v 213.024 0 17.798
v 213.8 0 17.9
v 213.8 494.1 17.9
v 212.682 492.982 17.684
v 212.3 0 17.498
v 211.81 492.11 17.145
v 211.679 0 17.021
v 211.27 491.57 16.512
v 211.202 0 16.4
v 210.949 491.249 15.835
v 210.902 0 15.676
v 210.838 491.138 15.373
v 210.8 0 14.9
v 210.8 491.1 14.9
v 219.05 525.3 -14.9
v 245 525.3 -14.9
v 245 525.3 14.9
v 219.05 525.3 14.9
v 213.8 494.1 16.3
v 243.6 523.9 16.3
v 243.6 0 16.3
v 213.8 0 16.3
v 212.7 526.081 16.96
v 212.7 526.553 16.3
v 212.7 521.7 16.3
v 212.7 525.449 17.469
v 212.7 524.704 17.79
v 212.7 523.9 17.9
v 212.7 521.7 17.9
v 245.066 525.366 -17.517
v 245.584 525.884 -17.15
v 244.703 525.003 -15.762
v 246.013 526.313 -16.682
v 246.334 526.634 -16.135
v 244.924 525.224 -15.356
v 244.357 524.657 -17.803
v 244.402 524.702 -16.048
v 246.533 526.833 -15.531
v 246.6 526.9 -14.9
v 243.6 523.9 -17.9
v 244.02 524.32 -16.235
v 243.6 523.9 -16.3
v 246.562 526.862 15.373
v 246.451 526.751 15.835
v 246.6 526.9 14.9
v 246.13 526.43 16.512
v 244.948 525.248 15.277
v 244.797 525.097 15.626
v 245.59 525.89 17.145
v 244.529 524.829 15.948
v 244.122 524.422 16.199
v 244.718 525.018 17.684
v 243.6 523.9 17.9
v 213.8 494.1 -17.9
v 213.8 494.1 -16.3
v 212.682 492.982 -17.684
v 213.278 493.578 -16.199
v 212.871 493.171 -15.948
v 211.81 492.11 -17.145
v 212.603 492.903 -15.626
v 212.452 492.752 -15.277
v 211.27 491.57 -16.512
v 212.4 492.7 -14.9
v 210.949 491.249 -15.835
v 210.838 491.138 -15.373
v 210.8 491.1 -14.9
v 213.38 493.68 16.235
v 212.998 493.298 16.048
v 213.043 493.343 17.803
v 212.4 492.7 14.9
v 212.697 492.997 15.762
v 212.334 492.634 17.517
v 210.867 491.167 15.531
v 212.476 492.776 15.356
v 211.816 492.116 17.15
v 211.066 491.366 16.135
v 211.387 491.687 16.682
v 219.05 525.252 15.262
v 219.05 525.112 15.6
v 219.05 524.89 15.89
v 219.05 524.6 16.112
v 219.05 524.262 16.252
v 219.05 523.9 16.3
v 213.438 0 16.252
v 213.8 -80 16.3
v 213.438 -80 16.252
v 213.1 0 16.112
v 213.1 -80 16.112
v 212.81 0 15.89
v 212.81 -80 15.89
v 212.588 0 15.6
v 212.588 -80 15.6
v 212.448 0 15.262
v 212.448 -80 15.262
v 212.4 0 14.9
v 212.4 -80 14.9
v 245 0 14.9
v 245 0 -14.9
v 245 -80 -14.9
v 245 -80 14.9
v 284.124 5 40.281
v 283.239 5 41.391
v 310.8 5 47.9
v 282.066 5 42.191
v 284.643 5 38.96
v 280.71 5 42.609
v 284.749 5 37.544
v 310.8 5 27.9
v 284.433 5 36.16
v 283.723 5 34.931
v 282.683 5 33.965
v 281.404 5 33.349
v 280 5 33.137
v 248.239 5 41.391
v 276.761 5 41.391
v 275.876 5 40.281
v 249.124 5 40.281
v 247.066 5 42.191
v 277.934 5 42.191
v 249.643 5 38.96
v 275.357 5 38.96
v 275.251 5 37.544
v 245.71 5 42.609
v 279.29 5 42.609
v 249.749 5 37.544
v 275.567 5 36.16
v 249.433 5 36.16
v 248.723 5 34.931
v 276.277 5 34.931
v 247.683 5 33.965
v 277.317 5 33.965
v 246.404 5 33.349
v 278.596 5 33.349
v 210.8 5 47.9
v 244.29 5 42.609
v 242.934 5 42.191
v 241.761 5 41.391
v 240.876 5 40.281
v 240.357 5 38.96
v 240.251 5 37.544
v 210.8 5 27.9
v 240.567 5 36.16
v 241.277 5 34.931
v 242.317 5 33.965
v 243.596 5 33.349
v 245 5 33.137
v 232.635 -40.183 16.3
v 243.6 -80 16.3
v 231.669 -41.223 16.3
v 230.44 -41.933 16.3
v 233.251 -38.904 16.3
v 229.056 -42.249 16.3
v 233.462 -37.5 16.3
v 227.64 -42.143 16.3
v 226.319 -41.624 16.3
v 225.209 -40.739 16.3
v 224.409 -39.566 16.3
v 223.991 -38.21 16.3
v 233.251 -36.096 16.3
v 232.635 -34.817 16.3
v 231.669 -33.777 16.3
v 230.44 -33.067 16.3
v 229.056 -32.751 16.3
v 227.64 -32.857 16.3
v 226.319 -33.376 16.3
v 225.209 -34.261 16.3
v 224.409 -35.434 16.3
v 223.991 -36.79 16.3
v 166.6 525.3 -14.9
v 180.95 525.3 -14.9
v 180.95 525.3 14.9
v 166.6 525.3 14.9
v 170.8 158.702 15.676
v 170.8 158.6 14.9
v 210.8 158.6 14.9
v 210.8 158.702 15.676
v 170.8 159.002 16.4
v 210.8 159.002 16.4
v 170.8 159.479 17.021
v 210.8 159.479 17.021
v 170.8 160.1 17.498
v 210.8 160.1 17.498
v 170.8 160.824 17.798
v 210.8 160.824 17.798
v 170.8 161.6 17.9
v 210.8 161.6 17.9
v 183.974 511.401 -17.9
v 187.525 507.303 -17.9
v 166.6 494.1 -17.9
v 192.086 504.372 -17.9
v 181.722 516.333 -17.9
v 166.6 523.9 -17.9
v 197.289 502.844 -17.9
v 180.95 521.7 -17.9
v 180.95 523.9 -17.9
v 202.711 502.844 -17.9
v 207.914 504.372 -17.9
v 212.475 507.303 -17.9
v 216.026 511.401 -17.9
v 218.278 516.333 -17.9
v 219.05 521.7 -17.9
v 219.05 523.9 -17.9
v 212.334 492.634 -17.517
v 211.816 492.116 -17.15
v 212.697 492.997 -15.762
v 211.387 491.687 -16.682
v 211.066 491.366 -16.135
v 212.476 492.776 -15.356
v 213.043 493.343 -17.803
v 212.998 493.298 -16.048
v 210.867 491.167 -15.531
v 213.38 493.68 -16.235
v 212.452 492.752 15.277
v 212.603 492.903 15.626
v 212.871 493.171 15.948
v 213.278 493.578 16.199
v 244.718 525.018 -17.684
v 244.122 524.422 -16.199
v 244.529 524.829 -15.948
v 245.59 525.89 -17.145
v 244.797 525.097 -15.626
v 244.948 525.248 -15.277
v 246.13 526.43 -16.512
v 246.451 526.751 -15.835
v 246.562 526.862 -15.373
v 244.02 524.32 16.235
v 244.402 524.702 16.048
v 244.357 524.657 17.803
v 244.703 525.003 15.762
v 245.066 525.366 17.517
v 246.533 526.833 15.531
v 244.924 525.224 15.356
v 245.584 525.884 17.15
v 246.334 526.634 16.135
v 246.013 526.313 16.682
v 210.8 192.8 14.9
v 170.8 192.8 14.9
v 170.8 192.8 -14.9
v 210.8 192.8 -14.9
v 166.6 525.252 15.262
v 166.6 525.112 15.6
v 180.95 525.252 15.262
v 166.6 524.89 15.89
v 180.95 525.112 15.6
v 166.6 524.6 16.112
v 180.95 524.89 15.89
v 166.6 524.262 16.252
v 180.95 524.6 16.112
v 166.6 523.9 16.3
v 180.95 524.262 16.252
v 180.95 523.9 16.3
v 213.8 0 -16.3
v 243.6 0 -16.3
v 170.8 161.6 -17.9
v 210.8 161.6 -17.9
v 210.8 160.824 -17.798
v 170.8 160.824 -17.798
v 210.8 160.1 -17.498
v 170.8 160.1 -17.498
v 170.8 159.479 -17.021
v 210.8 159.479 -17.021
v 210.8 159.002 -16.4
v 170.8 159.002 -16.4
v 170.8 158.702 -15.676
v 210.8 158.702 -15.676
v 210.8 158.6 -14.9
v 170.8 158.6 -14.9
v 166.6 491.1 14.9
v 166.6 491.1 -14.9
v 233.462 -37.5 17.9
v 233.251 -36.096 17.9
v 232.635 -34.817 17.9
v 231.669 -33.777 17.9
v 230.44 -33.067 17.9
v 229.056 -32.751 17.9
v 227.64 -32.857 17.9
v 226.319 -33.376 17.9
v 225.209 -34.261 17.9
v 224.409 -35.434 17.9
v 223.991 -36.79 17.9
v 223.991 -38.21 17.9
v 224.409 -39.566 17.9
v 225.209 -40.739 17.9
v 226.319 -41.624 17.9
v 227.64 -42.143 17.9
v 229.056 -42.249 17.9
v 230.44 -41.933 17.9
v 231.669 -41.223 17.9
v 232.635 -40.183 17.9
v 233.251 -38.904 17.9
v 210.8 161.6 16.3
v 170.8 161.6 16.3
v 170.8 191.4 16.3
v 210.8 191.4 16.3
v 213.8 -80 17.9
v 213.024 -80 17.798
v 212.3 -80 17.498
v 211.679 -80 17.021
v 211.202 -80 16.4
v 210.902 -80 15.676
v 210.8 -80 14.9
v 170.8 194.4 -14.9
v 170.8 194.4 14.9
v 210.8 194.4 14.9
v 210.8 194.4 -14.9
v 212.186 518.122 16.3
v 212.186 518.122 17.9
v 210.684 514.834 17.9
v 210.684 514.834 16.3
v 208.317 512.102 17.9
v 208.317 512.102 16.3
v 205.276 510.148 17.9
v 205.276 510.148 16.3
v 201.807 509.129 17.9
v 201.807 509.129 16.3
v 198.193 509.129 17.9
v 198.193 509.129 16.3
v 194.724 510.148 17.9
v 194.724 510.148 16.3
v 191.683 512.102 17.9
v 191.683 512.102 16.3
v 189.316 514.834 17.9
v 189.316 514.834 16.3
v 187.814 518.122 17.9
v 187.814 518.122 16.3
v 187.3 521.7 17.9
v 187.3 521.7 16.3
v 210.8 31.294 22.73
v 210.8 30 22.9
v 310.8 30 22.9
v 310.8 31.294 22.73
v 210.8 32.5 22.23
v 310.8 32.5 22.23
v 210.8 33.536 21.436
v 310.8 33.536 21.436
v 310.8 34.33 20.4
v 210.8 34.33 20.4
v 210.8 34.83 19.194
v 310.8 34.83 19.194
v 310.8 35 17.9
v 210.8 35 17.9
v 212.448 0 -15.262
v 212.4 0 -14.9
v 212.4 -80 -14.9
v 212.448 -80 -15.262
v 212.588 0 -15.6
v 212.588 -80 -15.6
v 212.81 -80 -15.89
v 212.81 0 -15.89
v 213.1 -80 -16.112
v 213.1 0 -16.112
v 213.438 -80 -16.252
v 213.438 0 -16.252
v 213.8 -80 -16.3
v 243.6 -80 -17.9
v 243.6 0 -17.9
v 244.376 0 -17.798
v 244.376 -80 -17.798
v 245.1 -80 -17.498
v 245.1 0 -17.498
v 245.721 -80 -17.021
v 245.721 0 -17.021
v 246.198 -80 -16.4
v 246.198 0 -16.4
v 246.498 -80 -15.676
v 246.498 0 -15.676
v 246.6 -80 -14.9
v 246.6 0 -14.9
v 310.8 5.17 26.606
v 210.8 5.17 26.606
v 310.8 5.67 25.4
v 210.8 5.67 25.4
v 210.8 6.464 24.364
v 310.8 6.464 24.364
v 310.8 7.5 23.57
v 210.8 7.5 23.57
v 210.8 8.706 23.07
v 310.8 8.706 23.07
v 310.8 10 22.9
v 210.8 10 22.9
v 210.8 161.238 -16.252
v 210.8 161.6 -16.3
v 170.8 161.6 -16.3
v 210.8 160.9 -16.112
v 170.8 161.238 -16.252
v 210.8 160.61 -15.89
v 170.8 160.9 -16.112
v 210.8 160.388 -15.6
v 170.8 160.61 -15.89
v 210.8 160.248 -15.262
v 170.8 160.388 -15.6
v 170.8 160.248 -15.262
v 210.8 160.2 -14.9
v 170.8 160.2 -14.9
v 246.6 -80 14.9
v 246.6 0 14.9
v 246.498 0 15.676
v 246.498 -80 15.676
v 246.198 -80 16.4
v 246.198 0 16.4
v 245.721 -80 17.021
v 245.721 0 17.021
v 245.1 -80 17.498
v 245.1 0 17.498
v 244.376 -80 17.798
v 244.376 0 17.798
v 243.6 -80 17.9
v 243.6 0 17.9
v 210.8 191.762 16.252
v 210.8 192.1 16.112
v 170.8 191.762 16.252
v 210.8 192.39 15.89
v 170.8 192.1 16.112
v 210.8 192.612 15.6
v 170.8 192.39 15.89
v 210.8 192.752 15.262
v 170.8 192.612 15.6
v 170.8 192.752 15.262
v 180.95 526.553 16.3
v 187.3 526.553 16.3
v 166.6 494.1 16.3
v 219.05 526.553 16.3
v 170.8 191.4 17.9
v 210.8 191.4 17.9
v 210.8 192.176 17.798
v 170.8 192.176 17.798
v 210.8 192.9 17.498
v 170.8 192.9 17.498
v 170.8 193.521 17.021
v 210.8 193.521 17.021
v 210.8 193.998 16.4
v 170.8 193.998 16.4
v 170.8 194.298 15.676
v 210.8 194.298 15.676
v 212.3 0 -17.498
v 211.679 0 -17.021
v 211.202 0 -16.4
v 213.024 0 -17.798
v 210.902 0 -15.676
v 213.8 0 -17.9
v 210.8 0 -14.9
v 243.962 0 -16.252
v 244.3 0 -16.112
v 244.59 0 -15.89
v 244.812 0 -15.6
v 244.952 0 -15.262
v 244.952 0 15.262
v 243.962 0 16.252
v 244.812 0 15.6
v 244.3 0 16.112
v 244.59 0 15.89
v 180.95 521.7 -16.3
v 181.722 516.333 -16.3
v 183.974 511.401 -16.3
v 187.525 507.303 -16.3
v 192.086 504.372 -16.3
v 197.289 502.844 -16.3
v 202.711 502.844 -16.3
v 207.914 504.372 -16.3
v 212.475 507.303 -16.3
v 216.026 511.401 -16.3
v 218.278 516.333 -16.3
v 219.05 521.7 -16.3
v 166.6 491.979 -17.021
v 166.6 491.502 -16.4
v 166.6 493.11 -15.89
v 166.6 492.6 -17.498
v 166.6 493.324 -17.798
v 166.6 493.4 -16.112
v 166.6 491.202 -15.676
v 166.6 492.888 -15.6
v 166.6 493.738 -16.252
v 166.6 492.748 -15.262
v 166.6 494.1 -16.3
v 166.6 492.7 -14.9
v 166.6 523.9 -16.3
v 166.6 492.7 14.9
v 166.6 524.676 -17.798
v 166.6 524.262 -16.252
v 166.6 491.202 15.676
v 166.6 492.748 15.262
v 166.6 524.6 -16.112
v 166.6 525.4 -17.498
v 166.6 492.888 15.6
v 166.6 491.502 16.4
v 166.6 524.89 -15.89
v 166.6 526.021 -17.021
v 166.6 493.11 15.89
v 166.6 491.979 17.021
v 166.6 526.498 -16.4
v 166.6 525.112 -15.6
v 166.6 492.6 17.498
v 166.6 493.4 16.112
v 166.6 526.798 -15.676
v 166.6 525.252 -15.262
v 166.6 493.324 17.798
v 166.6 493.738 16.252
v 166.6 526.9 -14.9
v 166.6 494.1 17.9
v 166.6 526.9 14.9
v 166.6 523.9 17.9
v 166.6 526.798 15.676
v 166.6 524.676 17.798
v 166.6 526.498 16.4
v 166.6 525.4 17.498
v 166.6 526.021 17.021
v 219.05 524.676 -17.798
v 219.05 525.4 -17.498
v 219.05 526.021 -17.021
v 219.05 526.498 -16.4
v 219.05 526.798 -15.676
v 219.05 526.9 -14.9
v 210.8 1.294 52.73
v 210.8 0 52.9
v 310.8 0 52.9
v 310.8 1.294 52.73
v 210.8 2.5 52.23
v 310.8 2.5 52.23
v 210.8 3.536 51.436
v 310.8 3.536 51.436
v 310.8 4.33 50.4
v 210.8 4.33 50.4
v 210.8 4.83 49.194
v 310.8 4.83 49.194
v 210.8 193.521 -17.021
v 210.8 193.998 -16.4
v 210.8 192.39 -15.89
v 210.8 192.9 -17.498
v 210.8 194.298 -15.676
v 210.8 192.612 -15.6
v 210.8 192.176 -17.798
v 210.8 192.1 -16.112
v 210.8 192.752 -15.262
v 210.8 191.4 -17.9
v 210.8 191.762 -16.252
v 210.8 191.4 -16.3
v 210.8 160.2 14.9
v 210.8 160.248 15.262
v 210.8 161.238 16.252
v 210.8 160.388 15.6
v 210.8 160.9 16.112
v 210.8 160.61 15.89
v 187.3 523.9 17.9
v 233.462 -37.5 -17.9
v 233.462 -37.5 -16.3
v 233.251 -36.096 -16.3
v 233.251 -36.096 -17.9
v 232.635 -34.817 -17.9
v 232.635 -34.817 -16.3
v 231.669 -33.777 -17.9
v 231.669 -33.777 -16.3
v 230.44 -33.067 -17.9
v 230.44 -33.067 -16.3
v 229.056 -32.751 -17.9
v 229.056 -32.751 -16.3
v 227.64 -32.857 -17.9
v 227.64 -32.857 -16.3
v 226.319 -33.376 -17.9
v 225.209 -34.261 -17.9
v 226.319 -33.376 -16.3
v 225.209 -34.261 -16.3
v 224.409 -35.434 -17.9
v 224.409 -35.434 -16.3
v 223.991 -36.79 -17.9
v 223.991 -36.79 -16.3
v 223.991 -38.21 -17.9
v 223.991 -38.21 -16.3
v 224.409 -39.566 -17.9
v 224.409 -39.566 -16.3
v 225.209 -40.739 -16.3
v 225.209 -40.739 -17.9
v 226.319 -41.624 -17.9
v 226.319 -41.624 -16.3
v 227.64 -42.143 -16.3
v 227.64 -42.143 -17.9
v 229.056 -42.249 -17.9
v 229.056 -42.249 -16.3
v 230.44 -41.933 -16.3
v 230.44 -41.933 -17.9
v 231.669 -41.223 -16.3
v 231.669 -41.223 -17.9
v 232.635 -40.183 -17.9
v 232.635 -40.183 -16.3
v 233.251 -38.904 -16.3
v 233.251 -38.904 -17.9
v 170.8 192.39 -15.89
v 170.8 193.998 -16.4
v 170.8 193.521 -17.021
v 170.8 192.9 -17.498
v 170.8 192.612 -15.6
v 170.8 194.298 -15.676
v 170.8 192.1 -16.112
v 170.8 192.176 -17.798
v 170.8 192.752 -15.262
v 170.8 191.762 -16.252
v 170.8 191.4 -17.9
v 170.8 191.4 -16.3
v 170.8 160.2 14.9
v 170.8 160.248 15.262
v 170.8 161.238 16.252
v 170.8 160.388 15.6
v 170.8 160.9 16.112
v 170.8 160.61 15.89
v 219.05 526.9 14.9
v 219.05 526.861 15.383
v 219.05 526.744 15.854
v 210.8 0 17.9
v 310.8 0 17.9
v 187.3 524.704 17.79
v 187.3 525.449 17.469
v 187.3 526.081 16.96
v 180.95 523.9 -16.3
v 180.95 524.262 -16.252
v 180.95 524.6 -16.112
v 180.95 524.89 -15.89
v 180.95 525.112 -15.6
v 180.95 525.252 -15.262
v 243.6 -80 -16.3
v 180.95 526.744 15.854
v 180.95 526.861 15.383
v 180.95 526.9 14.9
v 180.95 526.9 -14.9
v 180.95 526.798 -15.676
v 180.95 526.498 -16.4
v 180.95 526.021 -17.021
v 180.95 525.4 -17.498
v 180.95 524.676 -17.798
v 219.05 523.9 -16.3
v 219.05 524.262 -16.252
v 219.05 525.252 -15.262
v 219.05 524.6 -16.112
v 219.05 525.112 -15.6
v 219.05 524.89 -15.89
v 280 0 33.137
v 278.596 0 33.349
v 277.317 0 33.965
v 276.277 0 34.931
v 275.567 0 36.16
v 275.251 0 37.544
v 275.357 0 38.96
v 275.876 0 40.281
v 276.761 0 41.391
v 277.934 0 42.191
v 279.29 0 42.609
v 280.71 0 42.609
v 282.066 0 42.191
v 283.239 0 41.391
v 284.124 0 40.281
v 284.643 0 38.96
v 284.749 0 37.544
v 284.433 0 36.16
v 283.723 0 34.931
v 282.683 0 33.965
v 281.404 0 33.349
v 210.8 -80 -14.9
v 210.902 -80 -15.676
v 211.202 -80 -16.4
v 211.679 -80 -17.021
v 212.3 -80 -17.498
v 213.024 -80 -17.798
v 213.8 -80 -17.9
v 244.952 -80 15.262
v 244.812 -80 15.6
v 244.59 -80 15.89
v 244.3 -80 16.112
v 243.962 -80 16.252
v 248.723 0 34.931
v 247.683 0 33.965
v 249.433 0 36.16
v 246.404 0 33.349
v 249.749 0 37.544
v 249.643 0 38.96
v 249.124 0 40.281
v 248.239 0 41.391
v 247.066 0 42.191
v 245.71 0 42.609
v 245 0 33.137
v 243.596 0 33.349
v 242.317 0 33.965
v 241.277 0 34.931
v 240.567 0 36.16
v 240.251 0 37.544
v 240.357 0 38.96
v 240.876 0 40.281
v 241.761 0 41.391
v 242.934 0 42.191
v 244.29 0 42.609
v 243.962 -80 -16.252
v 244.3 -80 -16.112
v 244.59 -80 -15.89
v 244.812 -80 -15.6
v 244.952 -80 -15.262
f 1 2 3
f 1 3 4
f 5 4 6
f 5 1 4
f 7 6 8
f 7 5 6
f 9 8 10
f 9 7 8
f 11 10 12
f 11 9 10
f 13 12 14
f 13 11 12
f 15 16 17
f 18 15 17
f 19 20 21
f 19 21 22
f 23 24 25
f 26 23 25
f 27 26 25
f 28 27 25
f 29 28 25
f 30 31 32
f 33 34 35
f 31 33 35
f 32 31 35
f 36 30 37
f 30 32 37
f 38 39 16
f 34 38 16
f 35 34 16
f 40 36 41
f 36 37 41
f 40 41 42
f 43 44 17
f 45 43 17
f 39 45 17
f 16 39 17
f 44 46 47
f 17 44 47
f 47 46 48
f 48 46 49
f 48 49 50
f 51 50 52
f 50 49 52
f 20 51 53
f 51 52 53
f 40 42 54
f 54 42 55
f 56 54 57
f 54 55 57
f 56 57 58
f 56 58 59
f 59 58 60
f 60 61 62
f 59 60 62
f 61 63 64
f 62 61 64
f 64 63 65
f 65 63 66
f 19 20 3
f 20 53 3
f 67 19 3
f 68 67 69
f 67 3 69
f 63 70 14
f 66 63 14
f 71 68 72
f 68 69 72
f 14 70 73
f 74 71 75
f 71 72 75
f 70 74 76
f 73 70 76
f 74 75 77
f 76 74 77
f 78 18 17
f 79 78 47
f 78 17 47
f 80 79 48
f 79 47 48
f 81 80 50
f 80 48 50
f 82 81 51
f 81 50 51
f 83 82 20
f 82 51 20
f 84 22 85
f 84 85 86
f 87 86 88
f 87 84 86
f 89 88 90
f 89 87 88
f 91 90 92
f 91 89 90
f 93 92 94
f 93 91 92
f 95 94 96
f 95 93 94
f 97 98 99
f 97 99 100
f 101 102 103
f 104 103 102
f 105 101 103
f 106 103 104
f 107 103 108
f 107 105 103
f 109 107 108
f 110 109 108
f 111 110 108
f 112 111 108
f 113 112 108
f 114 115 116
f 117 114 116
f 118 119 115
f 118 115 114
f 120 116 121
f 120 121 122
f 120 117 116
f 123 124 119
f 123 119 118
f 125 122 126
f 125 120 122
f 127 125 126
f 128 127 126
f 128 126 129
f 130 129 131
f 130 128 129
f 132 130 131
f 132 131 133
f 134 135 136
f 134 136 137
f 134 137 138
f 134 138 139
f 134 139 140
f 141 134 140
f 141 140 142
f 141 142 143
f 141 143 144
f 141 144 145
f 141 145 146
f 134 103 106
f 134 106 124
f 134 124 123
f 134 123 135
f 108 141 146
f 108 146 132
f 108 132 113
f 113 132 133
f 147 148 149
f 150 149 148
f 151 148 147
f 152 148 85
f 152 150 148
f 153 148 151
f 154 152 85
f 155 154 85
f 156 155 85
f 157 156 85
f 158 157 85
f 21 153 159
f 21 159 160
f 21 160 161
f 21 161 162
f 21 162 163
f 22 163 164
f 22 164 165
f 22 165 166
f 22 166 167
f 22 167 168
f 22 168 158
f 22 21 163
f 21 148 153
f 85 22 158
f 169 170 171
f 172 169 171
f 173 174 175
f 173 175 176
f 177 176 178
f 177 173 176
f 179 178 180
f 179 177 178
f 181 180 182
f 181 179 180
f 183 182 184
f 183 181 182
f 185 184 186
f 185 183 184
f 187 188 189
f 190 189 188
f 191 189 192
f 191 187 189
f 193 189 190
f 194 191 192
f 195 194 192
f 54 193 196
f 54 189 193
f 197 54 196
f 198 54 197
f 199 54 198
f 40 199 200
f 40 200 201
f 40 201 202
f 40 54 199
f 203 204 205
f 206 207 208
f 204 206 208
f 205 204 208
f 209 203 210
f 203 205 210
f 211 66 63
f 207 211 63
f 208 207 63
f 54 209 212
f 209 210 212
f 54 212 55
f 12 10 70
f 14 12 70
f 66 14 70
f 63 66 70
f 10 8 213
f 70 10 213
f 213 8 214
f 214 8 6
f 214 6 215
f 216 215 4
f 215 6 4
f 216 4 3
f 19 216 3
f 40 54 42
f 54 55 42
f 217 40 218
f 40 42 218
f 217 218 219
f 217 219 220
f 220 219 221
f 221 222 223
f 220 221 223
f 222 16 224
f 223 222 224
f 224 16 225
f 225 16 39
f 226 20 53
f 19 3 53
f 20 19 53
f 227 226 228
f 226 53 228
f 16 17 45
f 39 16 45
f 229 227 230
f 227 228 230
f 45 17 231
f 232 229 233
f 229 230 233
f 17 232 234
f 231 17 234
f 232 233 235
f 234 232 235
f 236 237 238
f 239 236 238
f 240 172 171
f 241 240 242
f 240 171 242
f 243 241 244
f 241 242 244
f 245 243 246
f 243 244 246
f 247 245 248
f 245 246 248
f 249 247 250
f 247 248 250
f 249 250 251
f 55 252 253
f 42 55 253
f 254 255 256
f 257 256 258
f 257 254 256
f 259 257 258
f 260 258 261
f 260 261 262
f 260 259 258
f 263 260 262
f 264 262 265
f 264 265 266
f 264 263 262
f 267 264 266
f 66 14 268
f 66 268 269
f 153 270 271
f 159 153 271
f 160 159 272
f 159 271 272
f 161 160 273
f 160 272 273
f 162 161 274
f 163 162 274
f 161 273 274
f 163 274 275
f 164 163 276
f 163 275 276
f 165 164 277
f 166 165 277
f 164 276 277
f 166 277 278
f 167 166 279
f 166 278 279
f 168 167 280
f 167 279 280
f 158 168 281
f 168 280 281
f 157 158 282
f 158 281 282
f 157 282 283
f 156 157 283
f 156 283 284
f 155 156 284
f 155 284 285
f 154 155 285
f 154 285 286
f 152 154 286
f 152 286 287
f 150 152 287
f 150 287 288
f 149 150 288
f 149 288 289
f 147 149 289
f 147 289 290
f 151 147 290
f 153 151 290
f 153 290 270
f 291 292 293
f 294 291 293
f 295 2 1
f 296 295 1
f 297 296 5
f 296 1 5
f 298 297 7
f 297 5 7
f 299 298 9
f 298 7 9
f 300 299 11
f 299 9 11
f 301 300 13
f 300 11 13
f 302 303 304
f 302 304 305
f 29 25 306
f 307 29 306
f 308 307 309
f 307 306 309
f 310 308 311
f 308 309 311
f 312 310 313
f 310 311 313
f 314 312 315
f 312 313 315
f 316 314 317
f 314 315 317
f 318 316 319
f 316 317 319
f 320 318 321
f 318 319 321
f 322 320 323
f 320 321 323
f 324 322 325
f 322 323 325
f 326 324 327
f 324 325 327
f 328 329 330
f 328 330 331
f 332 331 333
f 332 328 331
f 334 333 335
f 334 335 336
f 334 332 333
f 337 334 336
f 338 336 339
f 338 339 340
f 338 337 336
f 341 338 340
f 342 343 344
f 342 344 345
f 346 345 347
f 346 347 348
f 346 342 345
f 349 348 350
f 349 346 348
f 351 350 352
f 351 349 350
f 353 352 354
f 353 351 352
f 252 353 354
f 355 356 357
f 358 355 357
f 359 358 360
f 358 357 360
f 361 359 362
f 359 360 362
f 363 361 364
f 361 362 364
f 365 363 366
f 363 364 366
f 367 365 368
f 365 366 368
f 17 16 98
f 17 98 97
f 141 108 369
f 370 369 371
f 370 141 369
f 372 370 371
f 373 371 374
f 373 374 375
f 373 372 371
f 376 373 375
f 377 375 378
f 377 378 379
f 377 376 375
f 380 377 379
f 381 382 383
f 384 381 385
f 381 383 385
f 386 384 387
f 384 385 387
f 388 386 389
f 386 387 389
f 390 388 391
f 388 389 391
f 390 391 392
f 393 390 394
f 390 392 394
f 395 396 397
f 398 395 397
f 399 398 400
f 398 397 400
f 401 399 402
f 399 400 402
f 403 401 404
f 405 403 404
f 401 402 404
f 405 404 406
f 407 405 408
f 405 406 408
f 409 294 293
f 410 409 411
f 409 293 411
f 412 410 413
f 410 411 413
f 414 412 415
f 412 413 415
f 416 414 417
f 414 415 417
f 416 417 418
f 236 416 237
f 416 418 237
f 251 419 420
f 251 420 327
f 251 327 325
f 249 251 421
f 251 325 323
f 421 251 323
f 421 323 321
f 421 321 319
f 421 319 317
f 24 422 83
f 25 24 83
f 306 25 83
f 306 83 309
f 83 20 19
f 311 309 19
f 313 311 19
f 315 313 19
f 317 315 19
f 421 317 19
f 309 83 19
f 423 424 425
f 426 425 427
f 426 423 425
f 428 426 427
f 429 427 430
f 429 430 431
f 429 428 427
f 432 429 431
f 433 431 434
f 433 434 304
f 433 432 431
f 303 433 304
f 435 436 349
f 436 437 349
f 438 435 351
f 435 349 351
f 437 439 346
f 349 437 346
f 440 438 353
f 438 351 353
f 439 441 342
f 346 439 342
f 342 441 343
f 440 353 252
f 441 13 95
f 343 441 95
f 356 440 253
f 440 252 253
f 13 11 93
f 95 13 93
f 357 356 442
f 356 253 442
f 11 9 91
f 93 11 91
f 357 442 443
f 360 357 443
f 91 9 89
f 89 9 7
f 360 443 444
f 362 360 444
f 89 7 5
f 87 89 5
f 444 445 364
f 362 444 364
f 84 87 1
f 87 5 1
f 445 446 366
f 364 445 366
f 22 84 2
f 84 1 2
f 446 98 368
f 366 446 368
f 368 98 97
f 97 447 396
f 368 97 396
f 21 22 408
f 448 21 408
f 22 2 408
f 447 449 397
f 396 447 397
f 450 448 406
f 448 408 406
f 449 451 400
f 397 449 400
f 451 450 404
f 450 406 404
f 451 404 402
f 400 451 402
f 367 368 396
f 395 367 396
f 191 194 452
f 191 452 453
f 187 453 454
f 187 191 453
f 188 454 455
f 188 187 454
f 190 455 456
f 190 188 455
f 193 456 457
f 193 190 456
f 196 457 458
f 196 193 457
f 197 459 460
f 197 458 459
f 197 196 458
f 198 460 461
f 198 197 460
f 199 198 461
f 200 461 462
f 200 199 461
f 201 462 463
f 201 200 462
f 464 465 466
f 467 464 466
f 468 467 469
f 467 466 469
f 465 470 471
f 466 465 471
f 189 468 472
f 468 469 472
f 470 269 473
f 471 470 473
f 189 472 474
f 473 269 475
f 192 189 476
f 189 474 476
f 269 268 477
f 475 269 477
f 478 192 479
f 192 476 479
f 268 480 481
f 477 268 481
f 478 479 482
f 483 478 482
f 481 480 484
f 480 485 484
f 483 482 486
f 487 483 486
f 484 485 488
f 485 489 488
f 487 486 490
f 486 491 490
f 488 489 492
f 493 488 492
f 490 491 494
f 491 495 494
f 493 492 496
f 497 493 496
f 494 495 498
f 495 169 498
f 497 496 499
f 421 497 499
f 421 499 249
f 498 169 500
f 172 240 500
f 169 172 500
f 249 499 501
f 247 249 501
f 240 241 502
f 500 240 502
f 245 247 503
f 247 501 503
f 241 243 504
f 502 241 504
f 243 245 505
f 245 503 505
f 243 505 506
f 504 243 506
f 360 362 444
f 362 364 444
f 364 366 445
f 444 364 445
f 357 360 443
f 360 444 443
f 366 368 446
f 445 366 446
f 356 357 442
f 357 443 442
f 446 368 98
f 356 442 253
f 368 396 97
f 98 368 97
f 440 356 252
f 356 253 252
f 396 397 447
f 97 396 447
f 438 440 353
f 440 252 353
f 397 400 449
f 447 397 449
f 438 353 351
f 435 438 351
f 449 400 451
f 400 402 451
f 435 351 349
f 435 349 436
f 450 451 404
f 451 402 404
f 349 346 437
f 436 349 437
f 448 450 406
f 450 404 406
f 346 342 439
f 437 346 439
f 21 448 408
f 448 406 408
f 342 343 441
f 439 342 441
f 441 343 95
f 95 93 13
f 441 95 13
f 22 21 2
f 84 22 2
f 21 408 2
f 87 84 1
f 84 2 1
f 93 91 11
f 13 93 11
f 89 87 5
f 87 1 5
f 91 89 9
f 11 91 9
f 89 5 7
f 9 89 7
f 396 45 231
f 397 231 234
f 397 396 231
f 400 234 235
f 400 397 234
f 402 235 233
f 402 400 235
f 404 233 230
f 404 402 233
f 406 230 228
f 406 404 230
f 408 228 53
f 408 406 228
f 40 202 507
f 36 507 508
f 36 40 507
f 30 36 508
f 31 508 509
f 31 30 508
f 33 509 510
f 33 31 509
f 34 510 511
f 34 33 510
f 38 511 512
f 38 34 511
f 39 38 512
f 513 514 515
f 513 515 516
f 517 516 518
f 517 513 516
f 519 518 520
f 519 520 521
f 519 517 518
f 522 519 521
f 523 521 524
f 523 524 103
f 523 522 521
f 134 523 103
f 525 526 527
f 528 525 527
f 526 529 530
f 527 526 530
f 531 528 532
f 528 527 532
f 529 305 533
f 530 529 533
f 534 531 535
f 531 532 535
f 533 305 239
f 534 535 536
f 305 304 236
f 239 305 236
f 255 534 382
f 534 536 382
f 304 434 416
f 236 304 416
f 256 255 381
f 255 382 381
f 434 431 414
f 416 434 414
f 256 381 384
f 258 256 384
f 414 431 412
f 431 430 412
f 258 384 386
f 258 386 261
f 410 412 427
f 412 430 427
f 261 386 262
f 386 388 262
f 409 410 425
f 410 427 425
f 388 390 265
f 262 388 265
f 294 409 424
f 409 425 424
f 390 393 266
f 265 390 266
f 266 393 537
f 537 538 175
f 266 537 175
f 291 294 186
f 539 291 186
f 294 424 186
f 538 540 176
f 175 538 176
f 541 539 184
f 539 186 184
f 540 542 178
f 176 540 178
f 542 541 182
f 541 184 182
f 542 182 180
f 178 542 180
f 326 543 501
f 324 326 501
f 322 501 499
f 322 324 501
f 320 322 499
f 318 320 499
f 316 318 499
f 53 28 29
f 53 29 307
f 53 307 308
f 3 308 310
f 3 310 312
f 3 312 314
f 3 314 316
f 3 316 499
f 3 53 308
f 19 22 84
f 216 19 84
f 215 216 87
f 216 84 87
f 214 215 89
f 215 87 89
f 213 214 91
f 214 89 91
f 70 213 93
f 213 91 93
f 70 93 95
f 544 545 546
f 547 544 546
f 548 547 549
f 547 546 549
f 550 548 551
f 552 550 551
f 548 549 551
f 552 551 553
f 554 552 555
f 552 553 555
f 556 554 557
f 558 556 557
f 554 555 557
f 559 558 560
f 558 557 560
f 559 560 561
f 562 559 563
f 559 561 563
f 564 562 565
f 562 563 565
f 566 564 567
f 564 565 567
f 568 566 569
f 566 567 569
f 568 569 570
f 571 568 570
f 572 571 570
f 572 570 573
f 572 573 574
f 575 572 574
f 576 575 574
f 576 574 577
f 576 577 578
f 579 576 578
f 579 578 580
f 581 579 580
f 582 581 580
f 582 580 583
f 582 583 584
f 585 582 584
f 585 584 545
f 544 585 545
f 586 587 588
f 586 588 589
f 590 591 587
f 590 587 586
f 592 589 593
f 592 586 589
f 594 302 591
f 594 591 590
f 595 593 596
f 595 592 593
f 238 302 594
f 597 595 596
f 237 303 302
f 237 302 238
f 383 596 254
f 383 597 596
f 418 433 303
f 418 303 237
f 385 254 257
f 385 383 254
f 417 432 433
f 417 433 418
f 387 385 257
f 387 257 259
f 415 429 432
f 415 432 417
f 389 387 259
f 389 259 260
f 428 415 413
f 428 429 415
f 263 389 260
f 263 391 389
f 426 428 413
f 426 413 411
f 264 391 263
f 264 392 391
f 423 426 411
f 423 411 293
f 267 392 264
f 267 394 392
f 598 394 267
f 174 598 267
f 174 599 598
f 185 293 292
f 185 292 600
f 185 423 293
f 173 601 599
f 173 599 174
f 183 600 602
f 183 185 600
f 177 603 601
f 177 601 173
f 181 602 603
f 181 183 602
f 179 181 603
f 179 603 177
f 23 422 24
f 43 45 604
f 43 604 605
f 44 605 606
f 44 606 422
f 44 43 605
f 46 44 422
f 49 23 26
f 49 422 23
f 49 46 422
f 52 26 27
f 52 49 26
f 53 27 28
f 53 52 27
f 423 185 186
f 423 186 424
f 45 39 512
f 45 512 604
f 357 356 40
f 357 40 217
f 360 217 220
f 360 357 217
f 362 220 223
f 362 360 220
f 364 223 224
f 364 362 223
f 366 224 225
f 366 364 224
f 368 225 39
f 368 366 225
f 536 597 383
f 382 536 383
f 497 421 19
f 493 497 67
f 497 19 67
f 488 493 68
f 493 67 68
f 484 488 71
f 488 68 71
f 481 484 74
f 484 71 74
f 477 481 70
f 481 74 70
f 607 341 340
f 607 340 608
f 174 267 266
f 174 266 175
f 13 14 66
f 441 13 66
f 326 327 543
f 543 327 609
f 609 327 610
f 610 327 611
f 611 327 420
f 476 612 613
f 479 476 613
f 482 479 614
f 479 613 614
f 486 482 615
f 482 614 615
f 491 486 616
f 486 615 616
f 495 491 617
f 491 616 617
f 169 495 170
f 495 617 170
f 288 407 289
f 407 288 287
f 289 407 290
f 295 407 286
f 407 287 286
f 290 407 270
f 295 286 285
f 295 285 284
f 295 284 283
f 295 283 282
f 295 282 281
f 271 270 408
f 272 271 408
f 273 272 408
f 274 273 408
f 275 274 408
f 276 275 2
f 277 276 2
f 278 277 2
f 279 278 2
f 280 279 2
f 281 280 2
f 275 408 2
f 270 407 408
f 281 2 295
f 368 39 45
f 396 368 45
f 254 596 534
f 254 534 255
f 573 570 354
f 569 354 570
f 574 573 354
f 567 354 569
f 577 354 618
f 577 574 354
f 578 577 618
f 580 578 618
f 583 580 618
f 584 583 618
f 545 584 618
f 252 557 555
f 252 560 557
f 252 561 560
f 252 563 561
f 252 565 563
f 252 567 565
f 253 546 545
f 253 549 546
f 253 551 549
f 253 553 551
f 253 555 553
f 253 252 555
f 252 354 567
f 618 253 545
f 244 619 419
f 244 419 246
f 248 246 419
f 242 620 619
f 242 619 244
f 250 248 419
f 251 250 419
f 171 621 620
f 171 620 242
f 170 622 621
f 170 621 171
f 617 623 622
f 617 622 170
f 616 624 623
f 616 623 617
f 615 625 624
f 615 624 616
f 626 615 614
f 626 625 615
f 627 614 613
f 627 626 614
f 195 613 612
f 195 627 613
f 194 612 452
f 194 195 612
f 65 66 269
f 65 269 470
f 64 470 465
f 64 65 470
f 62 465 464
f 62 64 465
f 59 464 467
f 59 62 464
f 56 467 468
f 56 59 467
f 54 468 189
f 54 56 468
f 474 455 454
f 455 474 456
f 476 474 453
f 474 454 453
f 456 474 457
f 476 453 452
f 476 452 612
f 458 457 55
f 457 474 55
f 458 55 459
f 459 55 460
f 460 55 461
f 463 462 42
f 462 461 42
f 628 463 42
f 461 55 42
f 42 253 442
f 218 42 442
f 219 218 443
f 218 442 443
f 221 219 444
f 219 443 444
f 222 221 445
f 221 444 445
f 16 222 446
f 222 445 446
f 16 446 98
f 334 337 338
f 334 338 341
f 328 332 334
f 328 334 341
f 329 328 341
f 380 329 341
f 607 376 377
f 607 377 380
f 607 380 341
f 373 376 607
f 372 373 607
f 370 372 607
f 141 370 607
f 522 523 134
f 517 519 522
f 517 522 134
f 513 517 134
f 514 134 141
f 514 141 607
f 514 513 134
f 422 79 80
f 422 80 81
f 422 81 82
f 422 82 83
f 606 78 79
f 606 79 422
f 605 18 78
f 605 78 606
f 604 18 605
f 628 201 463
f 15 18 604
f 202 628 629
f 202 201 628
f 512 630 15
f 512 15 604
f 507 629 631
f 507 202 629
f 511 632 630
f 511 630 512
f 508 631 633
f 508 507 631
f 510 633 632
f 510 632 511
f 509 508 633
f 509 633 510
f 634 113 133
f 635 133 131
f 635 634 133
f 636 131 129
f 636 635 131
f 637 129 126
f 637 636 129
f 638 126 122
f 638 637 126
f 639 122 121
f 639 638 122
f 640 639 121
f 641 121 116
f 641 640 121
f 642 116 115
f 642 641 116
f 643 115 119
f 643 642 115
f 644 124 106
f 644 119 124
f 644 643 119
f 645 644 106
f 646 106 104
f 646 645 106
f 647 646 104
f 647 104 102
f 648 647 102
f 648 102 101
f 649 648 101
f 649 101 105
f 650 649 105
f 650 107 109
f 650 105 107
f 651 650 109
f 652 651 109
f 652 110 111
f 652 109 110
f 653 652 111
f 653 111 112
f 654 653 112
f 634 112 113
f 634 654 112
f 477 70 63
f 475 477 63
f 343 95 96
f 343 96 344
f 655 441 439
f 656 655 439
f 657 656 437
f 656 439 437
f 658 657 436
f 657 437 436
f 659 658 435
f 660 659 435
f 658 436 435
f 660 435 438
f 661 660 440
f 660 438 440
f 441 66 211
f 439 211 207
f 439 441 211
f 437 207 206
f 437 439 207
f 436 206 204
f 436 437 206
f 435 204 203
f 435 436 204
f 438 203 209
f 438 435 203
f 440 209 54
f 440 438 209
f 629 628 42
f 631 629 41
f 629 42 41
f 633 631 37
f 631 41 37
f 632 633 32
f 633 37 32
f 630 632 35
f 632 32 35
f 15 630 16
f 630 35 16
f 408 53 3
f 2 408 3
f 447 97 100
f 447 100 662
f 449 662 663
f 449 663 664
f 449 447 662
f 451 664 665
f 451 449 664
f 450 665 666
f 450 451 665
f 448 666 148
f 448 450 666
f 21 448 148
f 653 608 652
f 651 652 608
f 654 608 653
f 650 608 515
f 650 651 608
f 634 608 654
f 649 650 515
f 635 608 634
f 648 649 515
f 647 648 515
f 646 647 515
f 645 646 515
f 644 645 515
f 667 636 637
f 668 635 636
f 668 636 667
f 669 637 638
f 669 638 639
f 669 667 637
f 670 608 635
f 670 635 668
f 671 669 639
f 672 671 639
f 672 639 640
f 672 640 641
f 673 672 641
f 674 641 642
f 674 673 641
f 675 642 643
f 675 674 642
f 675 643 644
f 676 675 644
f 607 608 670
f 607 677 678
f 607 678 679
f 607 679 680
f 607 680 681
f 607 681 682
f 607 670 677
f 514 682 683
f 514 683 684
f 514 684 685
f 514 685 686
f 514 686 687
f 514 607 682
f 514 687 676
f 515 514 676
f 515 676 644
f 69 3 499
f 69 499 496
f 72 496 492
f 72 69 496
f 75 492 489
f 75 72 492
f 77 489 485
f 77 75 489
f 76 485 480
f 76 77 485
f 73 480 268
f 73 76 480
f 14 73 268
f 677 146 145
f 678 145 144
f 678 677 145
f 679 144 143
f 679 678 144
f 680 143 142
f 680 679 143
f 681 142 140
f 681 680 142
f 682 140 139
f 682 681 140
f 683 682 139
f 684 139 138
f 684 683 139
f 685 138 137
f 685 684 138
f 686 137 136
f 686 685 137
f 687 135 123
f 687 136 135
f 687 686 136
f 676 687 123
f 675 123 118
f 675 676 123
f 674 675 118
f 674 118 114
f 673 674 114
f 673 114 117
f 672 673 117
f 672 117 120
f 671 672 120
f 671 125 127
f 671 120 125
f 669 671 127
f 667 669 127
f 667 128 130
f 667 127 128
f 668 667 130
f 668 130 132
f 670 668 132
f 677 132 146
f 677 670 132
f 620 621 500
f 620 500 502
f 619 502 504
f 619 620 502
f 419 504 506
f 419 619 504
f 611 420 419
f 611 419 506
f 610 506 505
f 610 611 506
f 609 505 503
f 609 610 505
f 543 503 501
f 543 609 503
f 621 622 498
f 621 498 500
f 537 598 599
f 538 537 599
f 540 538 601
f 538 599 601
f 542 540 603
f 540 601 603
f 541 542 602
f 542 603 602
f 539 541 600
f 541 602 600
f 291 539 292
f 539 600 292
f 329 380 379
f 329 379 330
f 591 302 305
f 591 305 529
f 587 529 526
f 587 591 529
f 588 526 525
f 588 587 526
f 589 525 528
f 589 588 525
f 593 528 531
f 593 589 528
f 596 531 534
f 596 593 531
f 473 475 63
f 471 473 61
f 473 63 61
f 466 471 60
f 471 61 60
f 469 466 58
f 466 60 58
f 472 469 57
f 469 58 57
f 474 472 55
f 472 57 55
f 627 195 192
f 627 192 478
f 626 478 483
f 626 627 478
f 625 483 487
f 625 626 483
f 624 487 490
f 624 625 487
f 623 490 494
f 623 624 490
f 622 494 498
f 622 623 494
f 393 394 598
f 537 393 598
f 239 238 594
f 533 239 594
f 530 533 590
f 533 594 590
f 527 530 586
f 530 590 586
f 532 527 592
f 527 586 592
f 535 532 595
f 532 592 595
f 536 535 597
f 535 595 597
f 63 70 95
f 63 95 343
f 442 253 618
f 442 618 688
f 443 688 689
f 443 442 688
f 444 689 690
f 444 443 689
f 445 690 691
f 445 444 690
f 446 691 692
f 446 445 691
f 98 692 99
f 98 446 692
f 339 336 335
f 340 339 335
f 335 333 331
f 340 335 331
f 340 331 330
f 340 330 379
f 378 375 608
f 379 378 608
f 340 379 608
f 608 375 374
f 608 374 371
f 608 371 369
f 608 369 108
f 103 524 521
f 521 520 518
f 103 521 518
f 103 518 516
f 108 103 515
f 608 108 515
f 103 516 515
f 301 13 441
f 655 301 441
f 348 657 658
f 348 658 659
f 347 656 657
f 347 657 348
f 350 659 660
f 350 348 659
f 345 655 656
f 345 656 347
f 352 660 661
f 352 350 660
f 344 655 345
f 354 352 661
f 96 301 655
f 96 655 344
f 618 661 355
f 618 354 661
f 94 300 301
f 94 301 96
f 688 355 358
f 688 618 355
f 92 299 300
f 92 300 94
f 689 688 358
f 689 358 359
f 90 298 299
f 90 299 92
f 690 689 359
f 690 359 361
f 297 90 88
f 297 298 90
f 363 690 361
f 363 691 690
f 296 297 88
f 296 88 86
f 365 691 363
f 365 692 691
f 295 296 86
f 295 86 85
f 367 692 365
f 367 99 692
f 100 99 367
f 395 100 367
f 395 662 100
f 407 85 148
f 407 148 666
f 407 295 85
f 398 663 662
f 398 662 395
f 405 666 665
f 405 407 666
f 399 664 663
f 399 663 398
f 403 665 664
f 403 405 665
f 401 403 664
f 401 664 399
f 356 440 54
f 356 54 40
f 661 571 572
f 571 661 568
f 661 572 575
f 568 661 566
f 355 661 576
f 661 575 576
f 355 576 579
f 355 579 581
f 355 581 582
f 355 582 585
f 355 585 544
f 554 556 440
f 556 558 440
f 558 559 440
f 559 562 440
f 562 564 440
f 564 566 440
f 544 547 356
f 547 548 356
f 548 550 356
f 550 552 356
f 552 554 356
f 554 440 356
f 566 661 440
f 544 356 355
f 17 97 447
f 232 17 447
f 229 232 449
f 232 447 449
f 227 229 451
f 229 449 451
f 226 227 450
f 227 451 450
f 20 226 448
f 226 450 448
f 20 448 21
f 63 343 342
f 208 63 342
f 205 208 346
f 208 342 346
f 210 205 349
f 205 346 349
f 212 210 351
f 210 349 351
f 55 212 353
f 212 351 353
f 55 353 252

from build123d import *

# Parameters (mm, degrees)
STRUCTURAL_MEMBERMAIN_DEPTH        = 1
STRUCTURAL_MEMBERMAIN_DEPTH_BACK   = 80
STRUCTURAL_MEMBERMAIN_2_DEPTH      = 536.314422766
STRUCTURAL_MEMBERMAIN_3_DEPTH      = 88.414422766
STRUCTURAL_MEMBERMAIN_4_DEPTH      = 58.9
CUT_EXTRUDETOPRAILGUIDE_DEPTH      = 583.027129952
CUT_EXTRUDETOPRAILGUIDE_DEPTH_BACK = 583.027129952
STRUCTURAL_MEMBERANGLE_DEPTH       = 100
SKETCH15_R                         = 4.7625
CUT_EXTRUDEMOUNTINGHOLES_DEPTH     = 615.018452491
CUT_EXTRUDEENLARGERAILGUIDE_START  = -17.9
CUT_EXTRUDEENLARGERAILGUIDE_DEPTH  = 34.2
SKETCH17_R                         = 4.7625
CUT_EXTRUDE1_DEPTH                 = 613.782090143


with BuildPart() as part:
    # Sketch11 → Structural MemberMain (new, two sides)
    with BuildSketch(Plane(origin=(228.7, 0, 0), x_dir=(-1, 0, 0), z_dir=(0, 1, 0))) as structural_membermain_sk:
        with BuildLine():
            Line((-14.9, 17.9), (14.9, 17.9))
            ThreePointArc((14.9, 17.9), (17.021320344, 17.021320344), (17.9, 14.9))
            Line((17.9, 14.9), (17.9, -14.9))
            ThreePointArc((17.9, -14.9), (17.021320344, -17.021320344), (14.9, -17.9))
            Line((14.9, -17.9), (-14.9, -17.9))
            ThreePointArc((-14.9, -17.9), (-17.021320344, -17.021320344), (-17.9, -14.9))
            Line((-17.9, -14.9), (-17.9, 14.9))
            ThreePointArc((-17.9, 14.9), (-17.021320344, 17.021320344), (-14.9, 17.9))
        make_face()
        with BuildLine():
            Line((-14.9, 16.3), (14.9, 16.3))
            ThreePointArc((14.9, 16.3), (15.889949494, 15.889949494), (16.3, 14.9))
            Line((16.3, 14.9), (16.3, -14.9))
            ThreePointArc((16.3, -14.9), (15.889949494, -15.889949494), (14.9, -16.3))
            Line((14.9, -16.3), (-14.9, -16.3))
            ThreePointArc((-14.9, -16.3), (-15.889949494, -15.889949494), (-16.3, -14.9))
            Line((-16.3, -14.9), (-16.3, 14.9))
            ThreePointArc((-16.3, 14.9), (-15.889949494, 15.889949494), (-14.9, 16.3))
        make_face(mode=Mode.SUBTRACT)
    extrude(amount=STRUCTURAL_MEMBERMAIN_DEPTH)
    extrude(structural_membermain_sk.sketch, amount=-STRUCTURAL_MEMBERMAIN_DEPTH_BACK)

    # Structural MemberMain mitre 1
    split(bisect_by=Plane(origin=(228.7, 0, 0), x_dir=(1, 0, 0), z_dir=(0, -1, 0)), keep=Keep.TOP)

    # Sketch17 → Cut-Extrude1 (cut, through all)
    with BuildSketch(Plane.XY.offset(17.9)):
        with Locations((228.7, -37.5)):
            Circle(SKETCH17_R)
    extrude(amount=-CUT_EXTRUDE1_DEPTH, mode=Mode.SUBTRACT)


with BuildPart() as body_2:
    # Sketch11 on segment 2 (carried to segment 2) → Structural MemberMain 2 (new body)
    with BuildSketch(Plane(origin=(228.7, -1, 0), x_dir=(-1, 0, 0), z_dir=(0, 1, 0))):
        with BuildLine():
            Line((-14.9, 17.9), (14.9, 17.9))
            ThreePointArc((14.9, 17.9), (17.021320344, 17.021320344), (17.9, 14.9))
            Line((17.9, 14.9), (17.9, -14.9))
            ThreePointArc((17.9, -14.9), (17.021320344, -17.021320344), (14.9, -17.9))
            Line((14.9, -17.9), (-14.9, -17.9))
            ThreePointArc((-14.9, -17.9), (-17.021320344, -17.021320344), (-17.9, -14.9))
            Line((-17.9, -14.9), (-17.9, 14.9))
            ThreePointArc((-17.9, 14.9), (-17.021320344, 17.021320344), (-14.9, 17.9))
        make_face()
        with BuildLine():
            Line((-14.9, 16.3), (14.9, 16.3))
            ThreePointArc((14.9, 16.3), (15.889949494, 15.889949494), (16.3, 14.9))
            Line((16.3, 14.9), (16.3, -14.9))
            ThreePointArc((16.3, -14.9), (15.889949494, -15.889949494), (14.9, -16.3))
            Line((14.9, -16.3), (-14.9, -16.3))
            ThreePointArc((-14.9, -16.3), (-15.889949494, -15.889949494), (-16.3, -14.9))
            Line((-16.3, -14.9), (-16.3, 14.9))
            ThreePointArc((-16.3, 14.9), (-15.889949494, 15.889949494), (-14.9, 16.3))
        make_face(mode=Mode.SUBTRACT)
    extrude(amount=STRUCTURAL_MEMBERMAIN_2_DEPTH)

    # Structural MemberMain 2 mitre 1
    split(bisect_by=Plane(origin=(228.7, 0, 0), x_dir=(-1, 0, 0), z_dir=(0, 1, 0)), keep=Keep.TOP)

    # Structural MemberMain 2 mitre 2
    split(bisect_by=Plane(origin=(228.7, 509, 0), x_dir=(0.707106781, 0.707106781, 0), z_dir=(0.707106781, -0.707106781, 0)), keep=Keep.TOP)


with BuildPart() as body_3:
    # Sketch11 on segment 3 (carried to segment 3) → Structural MemberMain 3 (new body)
    with BuildSketch(Plane(origin=(255.014422766, 509, 0), x_dir=(0, -1, 0), z_dir=(-1, 0, 0))):
        with BuildLine():
            Line((-14.9, 17.9), (14.9, 17.9))
            ThreePointArc((14.9, 17.9), (17.021320344, 17.021320344), (17.9, 14.9))
            Line((17.9, 14.9), (17.9, -14.9))
            ThreePointArc((17.9, -14.9), (17.021320344, -17.021320344), (14.9, -17.9))
            Line((14.9, -17.9), (-14.9, -17.9))
            ThreePointArc((-14.9, -17.9), (-17.021320344, -17.021320344), (-17.9, -14.9))
            Line((-17.9, -14.9), (-17.9, 14.9))
            ThreePointArc((-17.9, 14.9), (-17.021320344, 17.021320344), (-14.9, 17.9))
        make_face()
        with BuildLine():
            Line((-14.9, 16.3), (14.9, 16.3))
            ThreePointArc((14.9, 16.3), (15.889949494, 15.889949494), (16.3, 14.9))
            Line((16.3, 14.9), (16.3, -14.9))
            ThreePointArc((16.3, -14.9), (15.889949494, -15.889949494), (14.9, -16.3))
            Line((14.9, -16.3), (-14.9, -16.3))
            ThreePointArc((-14.9, -16.3), (-15.889949494, -15.889949494), (-16.3, -14.9))
            Line((-16.3, -14.9), (-16.3, 14.9))
            ThreePointArc((-16.3, 14.9), (-15.889949494, 15.889949494), (-14.9, 16.3))
        make_face(mode=Mode.SUBTRACT)
    extrude(amount=STRUCTURAL_MEMBERMAIN_3_DEPTH)

    # Structural MemberMain 3 mitre 1
    split(bisect_by=Plane(origin=(228.7, 509, 0), x_dir=(-0.707106781, -0.707106781, 0), z_dir=(-0.707106781, 0.707106781, 0)), keep=Keep.TOP)

    # Sketch12 → Cut-ExtrudeTopRailGuide (cut, two sides)
    with BuildSketch(Plane.XY) as cut_extrudetoprailguide_sk:
        with BuildLine():
            Line((187.3, 521.7), (187.3, 532.1))
            ThreePointArc((187.3, 532.1), (200, 544.8), (212.7, 532.1))
            Line((212.7, 532.1), (212.7, 521.7))
            ThreePointArc((212.7, 521.7), (200, 509), (187.3, 521.7))
        make_face()
    extrude(amount=CUT_EXTRUDETOPRAILGUIDE_DEPTH, mode=Mode.SUBTRACT)
    extrude(cut_extrudetoprailguide_sk.sketch, amount=-CUT_EXTRUDETOPRAILGUIDE_DEPTH_BACK, mode=Mode.SUBTRACT)

    # Sketch16 → Cut-ExtrudeEnlargeRailGuide (cut)
    with BuildSketch(Plane.XY.offset(CUT_EXTRUDEENLARGERAILGUIDE_START)):
        with BuildLine():
            Line((219.05, 521.7), (219.05, 532.1))
            ThreePointArc((219.05, 532.1), (200, 551.15), (180.95, 532.1))
            Line((180.95, 532.1), (180.95, 521.7))
            ThreePointArc((180.95, 521.7), (200, 502.65), (219.05, 521.7))
        make_face()
    extrude(amount=CUT_EXTRUDEENLARGERAILGUIDE_DEPTH, mode=Mode.SUBTRACT)


with BuildPart() as body_4:
    # Sketch11 on segment 4 (carried to segment 4) → Structural MemberMain 4 (new body)
    with BuildSketch(Plane(origin=(170.8, 176.5, 0), x_dir=(0, 1, 0), z_dir=(1, 0, 0))):
        with BuildLine():
            Line((-14.9, 17.9), (14.9, 17.9))
            ThreePointArc((14.9, 17.9), (17.021320344, 17.021320344), (17.9, 14.9))
            Line((17.9, 14.9), (17.9, -14.9))
            ThreePointArc((17.9, -14.9), (17.021320344, -17.021320344), (14.9, -17.9))
            Line((14.9, -17.9), (-14.9, -17.9))
            ThreePointArc((-14.9, -17.9), (-17.021320344, -17.021320344), (-17.9, -14.9))
            Line((-17.9, -14.9), (-17.9, 14.9))
            ThreePointArc((-17.9, 14.9), (-17.021320344, 17.021320344), (-14.9, 17.9))
        make_face()
        with BuildLine():
            Line((-14.9, 16.3), (14.9, 16.3))
            ThreePointArc((14.9, 16.3), (15.889949494, 15.889949494), (16.3, 14.9))
            Line((16.3, 14.9), (16.3, -14.9))
            ThreePointArc((16.3, -14.9), (15.889949494, -15.889949494), (14.9, -16.3))
            Line((14.9, -16.3), (-14.9, -16.3))
            ThreePointArc((-14.9, -16.3), (-15.889949494, -15.889949494), (-16.3, -14.9))
            Line((-16.3, -14.9), (-16.3, 14.9))
            ThreePointArc((-16.3, 14.9), (-15.889949494, 15.889949494), (-14.9, 16.3))
        make_face(mode=Mode.SUBTRACT)
    extrude(amount=STRUCTURAL_MEMBERMAIN_4_DEPTH)

    # Structural MemberMain 4 mitre 1
    split(bisect_by=Plane(origin=(210.8, 176.5, 0), x_dir=(0, -1, 0), z_dir=(-1, 0, 0)), keep=Keep.TOP)


with BuildPart() as body_5:
    # Sketch14 → Structural MemberAngle (new body)
    with BuildSketch(Plane(origin=(210.8, 0, 17.9), x_dir=(0, 1, 0), z_dir=(1, 0, 0))):
        with BuildLine():
            Line((0, 0), (0, 35))
            ThreePointArc((0, 35), (3.535533906, 33.535533906), (5, 30))
            Line((5, 30), (5, 10))
            ThreePointArc((5, 10), (6.464466094, 6.464466094), (10, 5))
            Line((10, 5), (30, 5))
            ThreePointArc((30, 5), (33.535533906, 3.535533906), (35, 0))
            Line((35, 0), (0, 0))
        make_face()
    extrude(amount=STRUCTURAL_MEMBERANGLE_DEPTH)

    # Sketch15 → Cut-ExtrudeMountingHoles (cut, through all)
    with BuildSketch(Plane(origin=(0, 0, 0), x_dir=(1, 0, 0), z_dir=(0, 1, 0))):
        with Locations(Location((245, -37.9, 0), (0, 0, 90))):
            Circle(SKETCH15_R)
        with Locations(Location((280, -37.9, 0), (0, 0, 90))):
            Circle(SKETCH15_R)
    extrude(amount=CUT_EXTRUDEMOUNTINGHOLES_DEPTH, mode=Mode.SUBTRACT)


solid = Compound([part.part, body_2.part, body_3.part, body_4.part, body_5.part])
